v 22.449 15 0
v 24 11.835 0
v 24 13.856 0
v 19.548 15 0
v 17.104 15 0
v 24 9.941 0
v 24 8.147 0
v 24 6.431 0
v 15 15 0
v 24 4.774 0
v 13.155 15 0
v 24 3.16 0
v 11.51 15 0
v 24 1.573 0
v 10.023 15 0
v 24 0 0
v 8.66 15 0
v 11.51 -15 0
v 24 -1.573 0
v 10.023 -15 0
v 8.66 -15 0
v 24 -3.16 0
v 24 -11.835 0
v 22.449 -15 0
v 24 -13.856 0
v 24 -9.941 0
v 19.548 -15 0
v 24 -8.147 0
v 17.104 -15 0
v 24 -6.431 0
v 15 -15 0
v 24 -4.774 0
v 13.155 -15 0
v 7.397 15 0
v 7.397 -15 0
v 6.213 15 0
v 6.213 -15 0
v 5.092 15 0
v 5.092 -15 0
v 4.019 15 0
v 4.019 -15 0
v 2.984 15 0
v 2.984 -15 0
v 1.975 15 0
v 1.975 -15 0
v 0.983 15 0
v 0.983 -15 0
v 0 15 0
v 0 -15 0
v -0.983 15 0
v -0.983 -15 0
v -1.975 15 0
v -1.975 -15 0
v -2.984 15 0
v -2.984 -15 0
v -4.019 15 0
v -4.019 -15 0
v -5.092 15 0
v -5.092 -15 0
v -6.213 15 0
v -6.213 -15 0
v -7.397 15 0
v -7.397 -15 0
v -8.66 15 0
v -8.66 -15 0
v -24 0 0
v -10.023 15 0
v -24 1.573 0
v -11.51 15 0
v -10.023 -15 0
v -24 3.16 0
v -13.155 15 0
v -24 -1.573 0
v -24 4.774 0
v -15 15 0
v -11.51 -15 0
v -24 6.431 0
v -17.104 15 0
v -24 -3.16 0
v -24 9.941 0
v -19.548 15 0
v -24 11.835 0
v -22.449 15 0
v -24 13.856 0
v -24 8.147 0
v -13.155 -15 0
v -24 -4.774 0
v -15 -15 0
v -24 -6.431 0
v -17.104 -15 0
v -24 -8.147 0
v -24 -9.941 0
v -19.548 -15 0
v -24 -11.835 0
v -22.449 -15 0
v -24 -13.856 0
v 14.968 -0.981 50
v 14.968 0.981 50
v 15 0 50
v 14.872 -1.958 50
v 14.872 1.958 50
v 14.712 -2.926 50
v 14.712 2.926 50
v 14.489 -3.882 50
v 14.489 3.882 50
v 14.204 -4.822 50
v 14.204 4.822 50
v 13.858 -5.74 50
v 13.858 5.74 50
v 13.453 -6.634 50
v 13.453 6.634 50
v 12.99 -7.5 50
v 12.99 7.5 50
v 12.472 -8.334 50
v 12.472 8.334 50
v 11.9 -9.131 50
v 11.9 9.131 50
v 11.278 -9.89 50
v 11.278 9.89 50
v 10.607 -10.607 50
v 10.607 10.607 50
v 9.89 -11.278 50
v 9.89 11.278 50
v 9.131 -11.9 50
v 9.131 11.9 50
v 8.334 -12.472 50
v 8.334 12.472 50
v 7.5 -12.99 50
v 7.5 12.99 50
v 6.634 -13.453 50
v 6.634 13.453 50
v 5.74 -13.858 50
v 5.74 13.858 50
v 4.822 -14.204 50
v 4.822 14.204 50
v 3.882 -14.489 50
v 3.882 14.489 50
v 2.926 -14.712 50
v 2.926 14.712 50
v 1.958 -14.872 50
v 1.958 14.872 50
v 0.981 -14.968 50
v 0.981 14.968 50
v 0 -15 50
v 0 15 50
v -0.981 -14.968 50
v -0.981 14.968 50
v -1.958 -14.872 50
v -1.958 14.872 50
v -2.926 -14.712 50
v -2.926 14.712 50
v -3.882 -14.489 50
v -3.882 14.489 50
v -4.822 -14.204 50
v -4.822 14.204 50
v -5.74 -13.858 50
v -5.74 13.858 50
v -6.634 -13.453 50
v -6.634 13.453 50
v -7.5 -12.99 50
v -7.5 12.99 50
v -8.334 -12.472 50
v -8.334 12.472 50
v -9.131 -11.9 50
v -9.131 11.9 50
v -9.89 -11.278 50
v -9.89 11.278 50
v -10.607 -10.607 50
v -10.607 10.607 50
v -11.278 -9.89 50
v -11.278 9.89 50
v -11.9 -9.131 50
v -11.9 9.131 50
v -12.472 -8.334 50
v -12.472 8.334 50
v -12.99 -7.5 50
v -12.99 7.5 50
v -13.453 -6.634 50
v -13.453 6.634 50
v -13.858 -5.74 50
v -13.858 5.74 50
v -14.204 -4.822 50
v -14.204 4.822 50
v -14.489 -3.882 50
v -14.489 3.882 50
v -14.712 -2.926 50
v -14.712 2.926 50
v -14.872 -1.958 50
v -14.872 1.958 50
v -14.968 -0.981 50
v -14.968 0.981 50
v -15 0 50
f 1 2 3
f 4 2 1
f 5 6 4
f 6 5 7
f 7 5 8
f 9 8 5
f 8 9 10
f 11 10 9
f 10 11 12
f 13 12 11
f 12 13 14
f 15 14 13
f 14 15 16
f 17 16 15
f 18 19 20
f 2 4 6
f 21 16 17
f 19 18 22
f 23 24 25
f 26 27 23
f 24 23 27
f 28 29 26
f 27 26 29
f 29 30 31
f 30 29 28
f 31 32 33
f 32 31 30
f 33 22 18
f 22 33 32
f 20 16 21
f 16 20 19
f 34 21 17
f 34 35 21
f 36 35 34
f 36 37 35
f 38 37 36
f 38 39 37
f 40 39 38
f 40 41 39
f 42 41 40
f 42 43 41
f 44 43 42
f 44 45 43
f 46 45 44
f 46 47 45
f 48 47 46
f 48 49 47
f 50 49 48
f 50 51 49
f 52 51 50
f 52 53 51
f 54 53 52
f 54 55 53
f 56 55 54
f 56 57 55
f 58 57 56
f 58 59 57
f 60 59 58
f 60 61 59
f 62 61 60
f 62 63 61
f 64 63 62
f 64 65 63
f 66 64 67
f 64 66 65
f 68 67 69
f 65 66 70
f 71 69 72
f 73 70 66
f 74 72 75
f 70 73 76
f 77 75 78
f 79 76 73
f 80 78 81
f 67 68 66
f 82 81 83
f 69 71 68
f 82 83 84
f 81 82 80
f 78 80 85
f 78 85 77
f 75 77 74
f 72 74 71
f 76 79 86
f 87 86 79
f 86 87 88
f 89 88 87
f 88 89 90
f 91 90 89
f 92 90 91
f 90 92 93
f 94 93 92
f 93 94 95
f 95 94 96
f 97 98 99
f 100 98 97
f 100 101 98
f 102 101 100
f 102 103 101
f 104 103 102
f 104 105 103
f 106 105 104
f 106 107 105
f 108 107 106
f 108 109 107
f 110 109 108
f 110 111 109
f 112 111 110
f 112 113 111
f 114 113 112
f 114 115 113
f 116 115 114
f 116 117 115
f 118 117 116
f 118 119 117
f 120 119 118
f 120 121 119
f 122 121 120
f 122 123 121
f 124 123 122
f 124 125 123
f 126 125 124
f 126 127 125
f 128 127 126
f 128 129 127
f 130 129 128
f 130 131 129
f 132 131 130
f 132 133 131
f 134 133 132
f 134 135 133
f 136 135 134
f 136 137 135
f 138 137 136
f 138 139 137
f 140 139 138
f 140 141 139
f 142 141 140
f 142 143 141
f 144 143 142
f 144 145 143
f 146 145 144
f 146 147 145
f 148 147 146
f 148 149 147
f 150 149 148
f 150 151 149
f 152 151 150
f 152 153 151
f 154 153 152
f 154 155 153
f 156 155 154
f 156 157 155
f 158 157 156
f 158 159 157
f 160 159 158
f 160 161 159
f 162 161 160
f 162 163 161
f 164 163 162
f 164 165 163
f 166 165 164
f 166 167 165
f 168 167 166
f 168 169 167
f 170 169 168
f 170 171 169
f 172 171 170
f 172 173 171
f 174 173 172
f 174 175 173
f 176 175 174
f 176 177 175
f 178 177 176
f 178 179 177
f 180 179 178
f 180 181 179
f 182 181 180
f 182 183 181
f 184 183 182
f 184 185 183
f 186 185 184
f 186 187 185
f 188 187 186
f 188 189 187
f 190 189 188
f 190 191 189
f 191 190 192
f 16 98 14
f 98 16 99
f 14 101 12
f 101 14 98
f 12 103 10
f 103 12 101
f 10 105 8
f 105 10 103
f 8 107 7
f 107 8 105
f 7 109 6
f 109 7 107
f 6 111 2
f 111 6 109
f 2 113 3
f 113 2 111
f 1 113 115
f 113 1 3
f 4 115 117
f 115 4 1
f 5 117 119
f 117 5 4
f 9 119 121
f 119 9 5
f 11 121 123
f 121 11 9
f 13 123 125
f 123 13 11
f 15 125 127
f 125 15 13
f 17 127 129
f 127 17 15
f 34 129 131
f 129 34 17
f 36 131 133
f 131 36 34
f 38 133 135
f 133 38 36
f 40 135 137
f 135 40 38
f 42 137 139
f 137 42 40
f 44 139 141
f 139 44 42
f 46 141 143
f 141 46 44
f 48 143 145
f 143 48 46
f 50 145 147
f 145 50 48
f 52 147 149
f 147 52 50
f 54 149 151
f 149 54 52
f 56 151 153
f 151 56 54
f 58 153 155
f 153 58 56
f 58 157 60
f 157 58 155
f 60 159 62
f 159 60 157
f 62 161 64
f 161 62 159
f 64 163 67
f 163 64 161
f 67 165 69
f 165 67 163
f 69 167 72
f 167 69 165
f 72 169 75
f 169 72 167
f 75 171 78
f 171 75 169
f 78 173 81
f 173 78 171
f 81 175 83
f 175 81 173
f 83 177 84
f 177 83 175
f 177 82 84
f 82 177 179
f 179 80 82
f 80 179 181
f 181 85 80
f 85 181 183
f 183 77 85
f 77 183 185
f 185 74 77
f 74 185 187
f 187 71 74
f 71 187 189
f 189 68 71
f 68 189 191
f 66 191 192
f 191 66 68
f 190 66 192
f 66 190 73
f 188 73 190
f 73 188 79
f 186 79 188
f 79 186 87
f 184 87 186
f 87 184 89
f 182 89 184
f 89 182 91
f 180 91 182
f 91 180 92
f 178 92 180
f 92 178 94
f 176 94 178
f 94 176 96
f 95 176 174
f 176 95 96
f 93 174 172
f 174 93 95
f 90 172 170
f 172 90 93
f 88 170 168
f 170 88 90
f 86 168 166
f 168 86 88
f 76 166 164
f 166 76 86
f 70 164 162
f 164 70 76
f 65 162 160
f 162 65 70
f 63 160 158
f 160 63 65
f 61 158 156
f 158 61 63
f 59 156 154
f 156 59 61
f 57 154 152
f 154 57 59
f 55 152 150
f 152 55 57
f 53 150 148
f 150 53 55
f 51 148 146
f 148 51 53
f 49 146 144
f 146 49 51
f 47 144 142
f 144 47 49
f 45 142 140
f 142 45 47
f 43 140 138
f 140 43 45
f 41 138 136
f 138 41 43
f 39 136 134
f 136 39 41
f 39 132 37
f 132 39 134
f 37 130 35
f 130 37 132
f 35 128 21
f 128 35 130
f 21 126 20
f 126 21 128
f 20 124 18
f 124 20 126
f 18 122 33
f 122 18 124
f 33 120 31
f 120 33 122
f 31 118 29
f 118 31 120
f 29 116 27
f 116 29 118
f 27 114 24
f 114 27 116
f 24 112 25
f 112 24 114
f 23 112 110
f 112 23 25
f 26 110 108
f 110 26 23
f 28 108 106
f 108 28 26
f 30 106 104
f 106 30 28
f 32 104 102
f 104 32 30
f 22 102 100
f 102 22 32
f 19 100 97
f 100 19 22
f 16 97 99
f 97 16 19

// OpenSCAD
$fn=96;
rect_width=48;
n=96; h=50; r=15; d=30;
function q(a)=let(c=cos(a),s=sin(a),v=min((rect_width/2)/max(abs(c),0.000001),(d/2)/max(abs(s),0.000001))) [v*c,v*s,0];
p=concat([for(i=[0:n-1]) q(360*i/n)],[for(i=[0:n-1]) [r*cos(360*i/n),r*sin(360*i/n),h]]);
f=concat([[for(i=[n-1:-1:0]) i]],[[for(i=[0:n-1]) n+i]], [for(i=[0:n-1]) [i,(i+1)%n,n+(i+1)%n,n+i]]);
polyhedron(points=p,faces=f,convexity=10);
